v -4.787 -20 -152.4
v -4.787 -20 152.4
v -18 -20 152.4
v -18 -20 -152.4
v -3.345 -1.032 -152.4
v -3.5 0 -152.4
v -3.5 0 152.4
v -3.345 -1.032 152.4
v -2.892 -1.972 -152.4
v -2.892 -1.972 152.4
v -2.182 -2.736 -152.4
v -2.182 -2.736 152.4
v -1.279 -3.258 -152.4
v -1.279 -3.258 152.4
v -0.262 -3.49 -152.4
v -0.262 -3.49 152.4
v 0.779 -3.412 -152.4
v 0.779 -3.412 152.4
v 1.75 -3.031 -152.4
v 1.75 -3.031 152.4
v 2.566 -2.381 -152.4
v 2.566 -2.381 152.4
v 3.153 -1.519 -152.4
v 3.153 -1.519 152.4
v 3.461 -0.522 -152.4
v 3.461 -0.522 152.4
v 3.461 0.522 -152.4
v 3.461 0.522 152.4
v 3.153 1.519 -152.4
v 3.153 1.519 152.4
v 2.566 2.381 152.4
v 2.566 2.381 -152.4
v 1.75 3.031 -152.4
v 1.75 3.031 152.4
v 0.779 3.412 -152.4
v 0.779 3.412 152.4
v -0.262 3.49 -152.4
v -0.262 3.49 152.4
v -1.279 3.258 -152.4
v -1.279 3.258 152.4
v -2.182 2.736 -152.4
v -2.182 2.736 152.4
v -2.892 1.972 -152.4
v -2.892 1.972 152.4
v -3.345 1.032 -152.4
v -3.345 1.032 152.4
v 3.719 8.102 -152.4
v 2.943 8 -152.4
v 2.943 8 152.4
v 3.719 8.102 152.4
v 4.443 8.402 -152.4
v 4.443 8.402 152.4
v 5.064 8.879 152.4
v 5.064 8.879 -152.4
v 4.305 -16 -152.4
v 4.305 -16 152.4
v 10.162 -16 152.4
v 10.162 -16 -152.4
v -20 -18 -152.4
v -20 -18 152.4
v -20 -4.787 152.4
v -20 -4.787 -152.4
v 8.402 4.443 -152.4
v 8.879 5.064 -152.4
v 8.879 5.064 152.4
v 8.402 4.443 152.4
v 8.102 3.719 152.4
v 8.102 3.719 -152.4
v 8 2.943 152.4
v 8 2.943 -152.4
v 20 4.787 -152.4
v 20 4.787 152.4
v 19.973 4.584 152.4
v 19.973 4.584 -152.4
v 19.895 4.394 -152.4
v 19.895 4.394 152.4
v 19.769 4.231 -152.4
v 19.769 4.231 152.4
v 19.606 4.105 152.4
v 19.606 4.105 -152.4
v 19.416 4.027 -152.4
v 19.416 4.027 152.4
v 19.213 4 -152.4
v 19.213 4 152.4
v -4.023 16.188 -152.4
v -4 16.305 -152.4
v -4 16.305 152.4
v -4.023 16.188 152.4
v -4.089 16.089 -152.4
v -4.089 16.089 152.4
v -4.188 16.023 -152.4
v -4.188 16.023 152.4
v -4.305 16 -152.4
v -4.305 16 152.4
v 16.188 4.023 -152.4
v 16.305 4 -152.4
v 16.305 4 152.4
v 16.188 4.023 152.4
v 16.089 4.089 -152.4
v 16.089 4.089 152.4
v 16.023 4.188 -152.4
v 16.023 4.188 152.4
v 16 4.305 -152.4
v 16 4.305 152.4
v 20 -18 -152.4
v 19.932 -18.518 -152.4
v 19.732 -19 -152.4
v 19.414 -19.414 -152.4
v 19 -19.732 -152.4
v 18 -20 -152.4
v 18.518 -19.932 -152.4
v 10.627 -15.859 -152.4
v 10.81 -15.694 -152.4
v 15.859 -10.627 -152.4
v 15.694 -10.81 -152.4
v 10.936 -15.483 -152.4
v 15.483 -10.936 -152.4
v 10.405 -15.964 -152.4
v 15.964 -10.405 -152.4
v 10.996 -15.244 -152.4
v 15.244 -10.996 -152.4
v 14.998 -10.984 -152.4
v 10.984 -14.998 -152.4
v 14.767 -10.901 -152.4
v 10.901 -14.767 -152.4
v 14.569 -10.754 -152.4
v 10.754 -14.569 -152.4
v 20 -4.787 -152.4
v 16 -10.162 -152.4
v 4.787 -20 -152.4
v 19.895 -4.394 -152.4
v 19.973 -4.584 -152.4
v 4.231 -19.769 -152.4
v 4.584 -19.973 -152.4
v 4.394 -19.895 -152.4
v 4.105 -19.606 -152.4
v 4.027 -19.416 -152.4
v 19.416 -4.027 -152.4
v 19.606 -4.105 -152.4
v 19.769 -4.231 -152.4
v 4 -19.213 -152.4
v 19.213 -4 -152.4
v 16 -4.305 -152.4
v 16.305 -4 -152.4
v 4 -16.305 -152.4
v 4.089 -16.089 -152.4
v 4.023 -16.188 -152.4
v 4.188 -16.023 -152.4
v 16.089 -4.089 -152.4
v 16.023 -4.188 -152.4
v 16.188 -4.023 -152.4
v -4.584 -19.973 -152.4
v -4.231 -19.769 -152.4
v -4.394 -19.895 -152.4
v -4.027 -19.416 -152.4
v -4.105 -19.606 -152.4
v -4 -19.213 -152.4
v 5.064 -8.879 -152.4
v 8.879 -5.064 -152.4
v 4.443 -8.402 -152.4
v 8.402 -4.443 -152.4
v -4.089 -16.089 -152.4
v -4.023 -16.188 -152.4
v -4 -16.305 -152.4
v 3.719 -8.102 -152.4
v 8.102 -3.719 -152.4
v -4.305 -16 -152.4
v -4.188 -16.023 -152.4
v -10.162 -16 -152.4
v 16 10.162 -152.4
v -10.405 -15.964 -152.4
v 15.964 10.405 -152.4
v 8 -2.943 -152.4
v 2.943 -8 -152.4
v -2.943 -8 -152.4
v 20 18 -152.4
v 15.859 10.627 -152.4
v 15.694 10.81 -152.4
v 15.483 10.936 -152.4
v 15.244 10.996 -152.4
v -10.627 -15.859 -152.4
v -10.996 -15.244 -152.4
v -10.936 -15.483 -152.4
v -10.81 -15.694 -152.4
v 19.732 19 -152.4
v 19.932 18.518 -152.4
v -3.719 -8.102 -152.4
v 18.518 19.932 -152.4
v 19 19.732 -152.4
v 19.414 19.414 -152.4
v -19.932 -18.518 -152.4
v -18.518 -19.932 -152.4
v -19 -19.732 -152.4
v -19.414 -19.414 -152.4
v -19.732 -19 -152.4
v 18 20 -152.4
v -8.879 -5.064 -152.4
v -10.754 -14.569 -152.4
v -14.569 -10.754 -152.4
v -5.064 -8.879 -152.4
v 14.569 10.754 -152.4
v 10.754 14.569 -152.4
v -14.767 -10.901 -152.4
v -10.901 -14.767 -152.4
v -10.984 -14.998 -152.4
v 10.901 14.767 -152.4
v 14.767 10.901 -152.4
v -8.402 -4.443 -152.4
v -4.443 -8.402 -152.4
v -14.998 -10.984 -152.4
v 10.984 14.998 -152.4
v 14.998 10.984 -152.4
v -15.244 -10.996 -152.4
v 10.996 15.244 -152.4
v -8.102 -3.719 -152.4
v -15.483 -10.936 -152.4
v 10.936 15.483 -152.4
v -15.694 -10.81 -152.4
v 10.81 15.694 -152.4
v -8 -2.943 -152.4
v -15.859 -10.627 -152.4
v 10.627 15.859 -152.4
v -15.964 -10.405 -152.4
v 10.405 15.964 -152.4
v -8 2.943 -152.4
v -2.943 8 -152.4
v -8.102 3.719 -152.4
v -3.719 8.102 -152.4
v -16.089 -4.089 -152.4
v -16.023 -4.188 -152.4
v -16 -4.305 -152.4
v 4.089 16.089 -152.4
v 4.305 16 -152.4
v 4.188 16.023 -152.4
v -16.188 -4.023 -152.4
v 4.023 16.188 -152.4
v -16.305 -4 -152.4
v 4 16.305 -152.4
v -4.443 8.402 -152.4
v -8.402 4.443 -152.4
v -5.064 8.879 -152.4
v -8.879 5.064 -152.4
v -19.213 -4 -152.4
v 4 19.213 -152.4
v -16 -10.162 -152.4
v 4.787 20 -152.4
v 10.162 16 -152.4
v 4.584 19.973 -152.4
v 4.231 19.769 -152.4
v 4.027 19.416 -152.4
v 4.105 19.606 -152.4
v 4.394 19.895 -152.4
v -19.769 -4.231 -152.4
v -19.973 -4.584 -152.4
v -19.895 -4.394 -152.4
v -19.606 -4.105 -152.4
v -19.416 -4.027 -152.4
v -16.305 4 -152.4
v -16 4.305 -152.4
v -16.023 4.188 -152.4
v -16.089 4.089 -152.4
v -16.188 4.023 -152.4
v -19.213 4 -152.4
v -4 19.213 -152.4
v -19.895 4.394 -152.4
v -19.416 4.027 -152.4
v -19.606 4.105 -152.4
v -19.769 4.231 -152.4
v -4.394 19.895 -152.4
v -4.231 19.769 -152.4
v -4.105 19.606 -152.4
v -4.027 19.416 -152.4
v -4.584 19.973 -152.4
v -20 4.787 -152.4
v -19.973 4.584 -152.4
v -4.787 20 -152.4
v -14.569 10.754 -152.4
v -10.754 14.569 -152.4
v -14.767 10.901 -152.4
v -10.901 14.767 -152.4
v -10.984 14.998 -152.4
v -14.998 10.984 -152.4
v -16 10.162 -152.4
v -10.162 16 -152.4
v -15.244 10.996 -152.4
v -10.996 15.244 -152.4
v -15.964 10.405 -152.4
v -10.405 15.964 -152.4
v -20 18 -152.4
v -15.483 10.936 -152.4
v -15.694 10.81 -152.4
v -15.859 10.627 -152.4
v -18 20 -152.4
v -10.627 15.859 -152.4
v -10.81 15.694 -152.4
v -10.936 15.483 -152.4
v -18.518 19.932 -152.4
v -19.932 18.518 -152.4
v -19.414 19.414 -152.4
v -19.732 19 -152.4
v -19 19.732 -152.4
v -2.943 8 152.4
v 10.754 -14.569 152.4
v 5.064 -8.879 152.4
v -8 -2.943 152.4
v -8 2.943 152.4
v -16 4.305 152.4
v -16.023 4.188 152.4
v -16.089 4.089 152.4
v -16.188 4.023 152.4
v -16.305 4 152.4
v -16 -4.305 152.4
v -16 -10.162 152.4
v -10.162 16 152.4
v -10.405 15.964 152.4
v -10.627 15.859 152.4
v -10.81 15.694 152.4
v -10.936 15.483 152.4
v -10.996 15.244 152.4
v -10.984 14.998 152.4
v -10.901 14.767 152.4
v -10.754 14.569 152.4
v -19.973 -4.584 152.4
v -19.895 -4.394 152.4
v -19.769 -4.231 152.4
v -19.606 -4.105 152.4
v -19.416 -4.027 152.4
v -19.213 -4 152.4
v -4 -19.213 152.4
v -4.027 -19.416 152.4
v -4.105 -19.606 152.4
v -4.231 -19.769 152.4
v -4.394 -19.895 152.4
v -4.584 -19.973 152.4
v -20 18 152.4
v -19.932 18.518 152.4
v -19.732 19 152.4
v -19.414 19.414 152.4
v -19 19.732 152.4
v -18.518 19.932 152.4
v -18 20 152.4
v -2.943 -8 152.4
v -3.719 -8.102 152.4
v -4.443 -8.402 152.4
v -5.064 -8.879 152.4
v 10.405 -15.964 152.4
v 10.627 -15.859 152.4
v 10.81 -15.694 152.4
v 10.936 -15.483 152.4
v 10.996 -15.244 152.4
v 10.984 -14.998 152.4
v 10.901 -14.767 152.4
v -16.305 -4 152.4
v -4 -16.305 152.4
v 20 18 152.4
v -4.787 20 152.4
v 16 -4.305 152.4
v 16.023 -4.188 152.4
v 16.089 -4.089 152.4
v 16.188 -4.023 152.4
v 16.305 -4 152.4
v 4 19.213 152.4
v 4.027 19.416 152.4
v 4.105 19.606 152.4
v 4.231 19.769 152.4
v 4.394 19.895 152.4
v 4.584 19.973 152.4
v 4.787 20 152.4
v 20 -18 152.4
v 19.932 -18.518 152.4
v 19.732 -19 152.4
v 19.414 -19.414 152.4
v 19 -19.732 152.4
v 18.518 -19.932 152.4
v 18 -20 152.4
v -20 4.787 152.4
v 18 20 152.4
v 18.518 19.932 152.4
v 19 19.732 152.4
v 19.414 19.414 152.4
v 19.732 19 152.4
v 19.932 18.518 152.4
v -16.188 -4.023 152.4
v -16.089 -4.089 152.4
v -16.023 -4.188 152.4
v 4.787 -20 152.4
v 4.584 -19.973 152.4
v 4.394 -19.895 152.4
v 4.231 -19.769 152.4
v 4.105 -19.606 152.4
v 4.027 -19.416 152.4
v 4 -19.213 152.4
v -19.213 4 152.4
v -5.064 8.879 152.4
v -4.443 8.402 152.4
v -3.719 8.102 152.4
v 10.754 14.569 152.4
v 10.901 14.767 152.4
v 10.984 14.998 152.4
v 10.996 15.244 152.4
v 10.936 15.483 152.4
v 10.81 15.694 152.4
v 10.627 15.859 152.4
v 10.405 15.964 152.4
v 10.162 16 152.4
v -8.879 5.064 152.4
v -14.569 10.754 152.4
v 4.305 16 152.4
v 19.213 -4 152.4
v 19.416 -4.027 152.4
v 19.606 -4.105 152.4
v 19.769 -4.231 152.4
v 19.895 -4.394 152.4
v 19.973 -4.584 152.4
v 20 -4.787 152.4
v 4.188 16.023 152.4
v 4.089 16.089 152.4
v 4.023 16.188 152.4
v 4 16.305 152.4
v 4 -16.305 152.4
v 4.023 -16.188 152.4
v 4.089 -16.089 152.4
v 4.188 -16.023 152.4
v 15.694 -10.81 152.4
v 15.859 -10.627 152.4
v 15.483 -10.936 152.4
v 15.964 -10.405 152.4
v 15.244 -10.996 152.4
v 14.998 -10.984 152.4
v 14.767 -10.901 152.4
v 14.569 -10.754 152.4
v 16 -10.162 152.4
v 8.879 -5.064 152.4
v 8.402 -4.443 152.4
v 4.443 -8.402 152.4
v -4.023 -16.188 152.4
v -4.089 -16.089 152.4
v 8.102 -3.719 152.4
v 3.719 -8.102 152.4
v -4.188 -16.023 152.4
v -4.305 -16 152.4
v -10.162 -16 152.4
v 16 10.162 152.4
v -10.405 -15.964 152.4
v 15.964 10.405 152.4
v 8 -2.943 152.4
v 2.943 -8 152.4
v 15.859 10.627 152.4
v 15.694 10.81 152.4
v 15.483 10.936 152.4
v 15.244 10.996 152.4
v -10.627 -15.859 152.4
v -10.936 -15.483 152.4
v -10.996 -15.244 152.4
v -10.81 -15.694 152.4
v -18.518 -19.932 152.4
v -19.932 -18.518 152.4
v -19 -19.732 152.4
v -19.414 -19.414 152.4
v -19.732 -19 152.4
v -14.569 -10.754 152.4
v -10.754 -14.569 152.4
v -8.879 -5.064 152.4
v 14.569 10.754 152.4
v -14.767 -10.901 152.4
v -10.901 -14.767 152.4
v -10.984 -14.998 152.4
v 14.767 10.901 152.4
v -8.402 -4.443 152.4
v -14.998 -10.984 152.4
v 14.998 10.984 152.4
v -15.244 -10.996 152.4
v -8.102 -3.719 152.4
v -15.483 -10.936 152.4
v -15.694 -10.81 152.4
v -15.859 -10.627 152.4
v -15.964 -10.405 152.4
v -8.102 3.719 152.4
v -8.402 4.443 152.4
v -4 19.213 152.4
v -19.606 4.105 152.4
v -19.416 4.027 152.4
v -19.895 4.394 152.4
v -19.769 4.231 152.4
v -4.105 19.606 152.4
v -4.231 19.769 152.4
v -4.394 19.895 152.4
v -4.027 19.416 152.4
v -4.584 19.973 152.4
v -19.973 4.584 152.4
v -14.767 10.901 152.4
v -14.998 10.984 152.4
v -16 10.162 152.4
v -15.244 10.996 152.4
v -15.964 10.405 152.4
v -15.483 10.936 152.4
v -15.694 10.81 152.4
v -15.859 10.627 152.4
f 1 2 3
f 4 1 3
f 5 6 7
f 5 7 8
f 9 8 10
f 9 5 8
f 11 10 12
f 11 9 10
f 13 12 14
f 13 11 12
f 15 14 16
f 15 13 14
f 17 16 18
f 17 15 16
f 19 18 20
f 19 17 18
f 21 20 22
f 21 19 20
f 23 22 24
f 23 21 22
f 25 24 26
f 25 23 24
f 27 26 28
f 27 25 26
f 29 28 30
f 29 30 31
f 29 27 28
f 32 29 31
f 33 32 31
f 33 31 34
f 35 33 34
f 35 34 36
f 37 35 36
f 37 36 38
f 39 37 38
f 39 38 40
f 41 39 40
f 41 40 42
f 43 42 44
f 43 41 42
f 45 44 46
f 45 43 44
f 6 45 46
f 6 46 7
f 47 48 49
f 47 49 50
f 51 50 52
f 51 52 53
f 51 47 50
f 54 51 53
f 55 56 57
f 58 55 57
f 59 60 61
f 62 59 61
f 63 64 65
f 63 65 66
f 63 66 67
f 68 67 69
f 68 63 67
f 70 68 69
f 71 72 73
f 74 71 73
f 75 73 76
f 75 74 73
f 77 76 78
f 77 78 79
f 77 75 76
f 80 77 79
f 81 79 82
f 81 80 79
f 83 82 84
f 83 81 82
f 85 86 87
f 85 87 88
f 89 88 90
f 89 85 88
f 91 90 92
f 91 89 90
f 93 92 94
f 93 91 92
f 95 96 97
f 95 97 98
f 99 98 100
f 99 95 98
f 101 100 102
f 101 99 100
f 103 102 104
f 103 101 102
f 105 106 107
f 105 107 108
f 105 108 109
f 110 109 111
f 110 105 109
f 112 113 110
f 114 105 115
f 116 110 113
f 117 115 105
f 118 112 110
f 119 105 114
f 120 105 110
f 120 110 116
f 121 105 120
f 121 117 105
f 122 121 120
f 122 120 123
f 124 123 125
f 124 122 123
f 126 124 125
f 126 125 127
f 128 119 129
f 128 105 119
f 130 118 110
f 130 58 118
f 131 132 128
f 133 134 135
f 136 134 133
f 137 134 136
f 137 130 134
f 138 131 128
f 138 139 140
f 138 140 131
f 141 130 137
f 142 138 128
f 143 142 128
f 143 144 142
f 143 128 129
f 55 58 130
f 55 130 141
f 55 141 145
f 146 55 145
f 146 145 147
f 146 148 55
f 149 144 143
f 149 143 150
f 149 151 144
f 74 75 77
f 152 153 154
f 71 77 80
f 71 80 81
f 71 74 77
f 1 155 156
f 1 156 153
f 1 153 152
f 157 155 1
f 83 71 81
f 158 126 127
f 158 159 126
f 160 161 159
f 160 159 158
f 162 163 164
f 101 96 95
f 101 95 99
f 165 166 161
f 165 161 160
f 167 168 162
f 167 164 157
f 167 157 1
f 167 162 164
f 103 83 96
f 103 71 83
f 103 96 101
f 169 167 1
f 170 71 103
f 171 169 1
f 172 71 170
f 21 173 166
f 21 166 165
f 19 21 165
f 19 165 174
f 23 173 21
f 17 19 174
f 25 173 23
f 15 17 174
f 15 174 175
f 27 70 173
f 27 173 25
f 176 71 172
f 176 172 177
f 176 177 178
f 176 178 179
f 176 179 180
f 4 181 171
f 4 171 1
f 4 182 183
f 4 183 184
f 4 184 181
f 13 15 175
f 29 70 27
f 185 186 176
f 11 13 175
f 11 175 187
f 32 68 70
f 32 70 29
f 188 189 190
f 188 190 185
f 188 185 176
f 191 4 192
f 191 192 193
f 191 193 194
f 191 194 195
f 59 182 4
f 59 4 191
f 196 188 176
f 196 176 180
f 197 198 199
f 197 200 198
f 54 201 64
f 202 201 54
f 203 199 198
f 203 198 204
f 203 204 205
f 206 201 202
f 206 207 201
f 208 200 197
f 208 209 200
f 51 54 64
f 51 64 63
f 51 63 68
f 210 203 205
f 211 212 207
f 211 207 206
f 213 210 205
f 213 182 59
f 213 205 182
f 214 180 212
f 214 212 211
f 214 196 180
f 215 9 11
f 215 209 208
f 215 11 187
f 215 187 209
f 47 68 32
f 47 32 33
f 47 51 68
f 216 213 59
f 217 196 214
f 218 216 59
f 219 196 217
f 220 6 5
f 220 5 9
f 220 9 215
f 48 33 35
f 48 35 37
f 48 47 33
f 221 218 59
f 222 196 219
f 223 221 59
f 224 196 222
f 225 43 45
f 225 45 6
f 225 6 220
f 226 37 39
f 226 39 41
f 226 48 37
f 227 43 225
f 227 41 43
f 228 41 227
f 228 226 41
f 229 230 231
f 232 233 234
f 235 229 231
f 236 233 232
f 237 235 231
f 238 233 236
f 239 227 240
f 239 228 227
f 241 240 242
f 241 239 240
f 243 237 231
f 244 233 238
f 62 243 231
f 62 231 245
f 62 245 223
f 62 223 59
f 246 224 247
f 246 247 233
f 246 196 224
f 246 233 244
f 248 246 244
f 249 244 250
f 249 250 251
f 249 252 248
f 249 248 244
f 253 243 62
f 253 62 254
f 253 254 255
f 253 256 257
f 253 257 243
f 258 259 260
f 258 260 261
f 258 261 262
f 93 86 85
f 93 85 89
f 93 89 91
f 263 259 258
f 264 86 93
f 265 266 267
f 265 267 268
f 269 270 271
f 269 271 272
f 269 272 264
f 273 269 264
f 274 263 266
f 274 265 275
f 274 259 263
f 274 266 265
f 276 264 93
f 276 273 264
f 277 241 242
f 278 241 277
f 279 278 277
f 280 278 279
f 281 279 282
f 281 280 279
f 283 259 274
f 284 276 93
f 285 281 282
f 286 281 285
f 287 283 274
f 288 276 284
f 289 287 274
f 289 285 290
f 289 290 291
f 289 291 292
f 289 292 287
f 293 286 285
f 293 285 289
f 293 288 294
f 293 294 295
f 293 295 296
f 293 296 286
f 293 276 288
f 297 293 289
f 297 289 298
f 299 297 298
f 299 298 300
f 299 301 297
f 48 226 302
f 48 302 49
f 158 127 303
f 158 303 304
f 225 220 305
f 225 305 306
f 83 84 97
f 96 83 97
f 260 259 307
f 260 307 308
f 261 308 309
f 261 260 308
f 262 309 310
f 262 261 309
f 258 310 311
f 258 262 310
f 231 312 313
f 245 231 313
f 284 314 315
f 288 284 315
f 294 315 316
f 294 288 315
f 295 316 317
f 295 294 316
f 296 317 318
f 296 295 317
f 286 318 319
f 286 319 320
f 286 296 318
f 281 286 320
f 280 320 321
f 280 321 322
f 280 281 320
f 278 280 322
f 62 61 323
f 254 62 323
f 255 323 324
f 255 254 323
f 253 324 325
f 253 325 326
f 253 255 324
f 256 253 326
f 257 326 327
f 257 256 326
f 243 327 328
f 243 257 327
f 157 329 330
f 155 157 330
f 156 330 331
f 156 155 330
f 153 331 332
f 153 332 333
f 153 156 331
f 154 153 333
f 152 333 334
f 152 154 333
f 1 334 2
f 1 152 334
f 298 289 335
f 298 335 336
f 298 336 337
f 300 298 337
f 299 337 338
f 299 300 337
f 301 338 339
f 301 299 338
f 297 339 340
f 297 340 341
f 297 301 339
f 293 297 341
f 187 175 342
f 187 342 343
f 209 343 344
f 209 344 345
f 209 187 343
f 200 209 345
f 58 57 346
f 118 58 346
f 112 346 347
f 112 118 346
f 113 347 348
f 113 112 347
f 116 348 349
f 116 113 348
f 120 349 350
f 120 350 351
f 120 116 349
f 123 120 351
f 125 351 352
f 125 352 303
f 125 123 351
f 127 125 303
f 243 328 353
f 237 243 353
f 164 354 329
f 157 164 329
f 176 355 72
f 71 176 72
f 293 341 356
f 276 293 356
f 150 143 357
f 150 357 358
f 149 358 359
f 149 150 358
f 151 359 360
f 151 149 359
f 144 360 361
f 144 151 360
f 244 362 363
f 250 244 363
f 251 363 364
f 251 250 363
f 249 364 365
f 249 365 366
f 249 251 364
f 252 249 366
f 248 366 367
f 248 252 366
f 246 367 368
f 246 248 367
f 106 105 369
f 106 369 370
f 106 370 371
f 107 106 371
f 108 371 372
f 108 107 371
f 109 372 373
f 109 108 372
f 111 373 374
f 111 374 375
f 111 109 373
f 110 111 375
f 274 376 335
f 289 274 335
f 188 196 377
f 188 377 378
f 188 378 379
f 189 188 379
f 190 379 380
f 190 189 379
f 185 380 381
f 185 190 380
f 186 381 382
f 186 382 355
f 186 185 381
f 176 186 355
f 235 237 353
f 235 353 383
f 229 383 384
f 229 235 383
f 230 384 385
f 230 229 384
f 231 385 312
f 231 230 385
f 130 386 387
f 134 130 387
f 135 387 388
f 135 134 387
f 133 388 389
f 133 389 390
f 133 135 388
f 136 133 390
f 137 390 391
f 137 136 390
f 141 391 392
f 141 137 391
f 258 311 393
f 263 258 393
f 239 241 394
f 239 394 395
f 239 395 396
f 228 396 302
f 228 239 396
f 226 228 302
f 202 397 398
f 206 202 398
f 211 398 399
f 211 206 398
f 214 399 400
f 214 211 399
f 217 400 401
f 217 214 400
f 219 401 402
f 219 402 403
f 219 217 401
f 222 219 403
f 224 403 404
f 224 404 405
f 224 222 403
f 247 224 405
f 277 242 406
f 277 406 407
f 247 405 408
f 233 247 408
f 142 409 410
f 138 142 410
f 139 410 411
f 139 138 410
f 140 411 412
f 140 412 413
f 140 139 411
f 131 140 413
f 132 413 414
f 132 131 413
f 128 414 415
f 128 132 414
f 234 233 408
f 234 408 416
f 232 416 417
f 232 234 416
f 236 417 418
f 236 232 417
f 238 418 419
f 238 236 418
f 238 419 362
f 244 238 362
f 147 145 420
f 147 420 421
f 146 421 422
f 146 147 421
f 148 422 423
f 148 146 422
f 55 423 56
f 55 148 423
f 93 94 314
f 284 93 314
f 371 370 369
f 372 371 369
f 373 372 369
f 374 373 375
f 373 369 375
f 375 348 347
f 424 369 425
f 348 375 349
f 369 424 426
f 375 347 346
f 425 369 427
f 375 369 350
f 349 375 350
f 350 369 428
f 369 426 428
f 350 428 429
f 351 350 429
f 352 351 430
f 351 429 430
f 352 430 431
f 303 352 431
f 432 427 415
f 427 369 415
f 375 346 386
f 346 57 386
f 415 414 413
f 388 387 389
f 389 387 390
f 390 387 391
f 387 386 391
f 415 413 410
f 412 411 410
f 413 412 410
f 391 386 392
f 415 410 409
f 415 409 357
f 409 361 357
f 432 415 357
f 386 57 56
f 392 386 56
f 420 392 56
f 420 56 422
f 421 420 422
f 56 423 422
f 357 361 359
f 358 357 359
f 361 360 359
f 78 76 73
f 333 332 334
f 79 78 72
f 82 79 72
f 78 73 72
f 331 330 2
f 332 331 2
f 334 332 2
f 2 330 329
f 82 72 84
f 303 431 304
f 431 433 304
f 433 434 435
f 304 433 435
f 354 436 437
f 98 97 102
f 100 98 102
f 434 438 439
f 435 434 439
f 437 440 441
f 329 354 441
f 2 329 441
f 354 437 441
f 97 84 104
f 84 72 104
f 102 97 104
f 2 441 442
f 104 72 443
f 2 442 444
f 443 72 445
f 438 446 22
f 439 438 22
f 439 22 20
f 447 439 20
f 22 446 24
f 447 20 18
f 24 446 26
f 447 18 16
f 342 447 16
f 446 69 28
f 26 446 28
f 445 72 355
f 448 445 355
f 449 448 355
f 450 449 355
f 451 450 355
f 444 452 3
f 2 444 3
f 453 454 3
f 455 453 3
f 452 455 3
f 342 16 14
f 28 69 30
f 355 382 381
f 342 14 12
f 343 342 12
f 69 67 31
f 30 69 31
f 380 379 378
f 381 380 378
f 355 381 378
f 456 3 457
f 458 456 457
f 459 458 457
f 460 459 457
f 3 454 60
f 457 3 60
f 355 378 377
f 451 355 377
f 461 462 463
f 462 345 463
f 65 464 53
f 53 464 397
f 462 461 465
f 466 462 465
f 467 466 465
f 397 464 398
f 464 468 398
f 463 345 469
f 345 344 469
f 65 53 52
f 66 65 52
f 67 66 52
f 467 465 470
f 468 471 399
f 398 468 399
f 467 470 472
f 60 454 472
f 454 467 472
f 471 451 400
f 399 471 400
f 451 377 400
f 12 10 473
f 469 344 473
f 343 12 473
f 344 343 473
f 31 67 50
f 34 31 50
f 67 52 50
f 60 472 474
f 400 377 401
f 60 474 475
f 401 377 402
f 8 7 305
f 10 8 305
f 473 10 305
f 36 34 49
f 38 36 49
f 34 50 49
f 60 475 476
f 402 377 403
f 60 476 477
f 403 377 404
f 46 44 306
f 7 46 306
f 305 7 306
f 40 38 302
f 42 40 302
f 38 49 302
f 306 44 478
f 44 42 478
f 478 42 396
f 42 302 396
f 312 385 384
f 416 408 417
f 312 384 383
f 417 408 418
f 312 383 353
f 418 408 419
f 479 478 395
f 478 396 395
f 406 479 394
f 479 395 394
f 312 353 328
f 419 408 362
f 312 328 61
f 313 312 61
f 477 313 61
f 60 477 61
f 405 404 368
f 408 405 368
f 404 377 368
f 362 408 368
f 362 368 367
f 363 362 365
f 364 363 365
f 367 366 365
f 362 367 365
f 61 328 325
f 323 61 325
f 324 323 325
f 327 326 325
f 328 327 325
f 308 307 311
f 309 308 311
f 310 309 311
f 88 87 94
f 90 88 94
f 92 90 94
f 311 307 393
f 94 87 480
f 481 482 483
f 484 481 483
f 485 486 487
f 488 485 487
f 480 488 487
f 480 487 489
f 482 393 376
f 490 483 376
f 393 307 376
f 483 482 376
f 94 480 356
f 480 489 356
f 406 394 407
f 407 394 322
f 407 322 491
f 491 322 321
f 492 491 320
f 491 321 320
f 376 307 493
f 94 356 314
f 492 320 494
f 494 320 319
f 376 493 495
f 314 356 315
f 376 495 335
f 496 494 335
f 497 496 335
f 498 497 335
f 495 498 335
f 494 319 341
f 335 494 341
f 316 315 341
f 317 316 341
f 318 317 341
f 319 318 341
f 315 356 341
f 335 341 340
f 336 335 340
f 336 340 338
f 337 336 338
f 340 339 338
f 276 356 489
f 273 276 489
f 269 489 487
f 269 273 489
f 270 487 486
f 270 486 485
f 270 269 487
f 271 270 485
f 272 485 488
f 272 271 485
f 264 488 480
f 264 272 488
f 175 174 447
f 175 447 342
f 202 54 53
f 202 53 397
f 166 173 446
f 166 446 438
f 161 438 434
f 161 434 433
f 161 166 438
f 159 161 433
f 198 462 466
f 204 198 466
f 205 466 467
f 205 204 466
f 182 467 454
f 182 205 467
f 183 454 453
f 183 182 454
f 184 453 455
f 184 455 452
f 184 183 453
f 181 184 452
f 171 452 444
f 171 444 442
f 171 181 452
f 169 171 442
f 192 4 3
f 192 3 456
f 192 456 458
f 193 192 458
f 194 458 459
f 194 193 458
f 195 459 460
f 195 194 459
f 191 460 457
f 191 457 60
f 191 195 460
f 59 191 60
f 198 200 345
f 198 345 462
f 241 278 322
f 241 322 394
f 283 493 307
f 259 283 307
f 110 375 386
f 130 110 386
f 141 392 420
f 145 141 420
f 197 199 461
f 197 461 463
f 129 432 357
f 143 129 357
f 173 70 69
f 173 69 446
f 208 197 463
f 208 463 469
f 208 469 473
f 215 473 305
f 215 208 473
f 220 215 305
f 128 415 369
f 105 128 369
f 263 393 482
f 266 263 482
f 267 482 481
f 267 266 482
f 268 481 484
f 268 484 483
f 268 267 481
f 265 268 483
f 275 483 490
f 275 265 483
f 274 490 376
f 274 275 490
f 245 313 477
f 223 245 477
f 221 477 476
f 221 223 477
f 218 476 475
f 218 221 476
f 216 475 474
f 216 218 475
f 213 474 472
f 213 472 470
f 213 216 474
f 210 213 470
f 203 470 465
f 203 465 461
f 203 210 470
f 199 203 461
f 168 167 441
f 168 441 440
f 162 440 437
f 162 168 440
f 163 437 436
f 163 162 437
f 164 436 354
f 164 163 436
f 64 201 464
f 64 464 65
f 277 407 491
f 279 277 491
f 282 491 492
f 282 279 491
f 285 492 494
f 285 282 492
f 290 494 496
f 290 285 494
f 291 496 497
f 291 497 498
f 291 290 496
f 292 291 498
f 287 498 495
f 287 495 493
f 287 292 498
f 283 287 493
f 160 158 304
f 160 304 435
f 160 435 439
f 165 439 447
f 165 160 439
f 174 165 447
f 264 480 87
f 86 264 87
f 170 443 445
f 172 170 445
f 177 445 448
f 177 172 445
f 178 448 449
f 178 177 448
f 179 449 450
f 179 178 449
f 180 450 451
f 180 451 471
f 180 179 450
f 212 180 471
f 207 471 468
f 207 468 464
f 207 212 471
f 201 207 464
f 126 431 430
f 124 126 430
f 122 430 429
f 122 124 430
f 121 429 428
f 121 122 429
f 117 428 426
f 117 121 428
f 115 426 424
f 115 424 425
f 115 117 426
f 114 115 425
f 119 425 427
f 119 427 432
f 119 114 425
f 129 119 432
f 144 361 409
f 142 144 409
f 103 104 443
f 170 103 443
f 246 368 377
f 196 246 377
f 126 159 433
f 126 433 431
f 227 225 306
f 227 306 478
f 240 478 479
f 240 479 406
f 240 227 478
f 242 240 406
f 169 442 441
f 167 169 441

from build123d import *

# Parameters (mm, degrees)
BOSS_EXTRUDE1_DEPTH      = 152.4
BOSS_EXTRUDE1_DEPTH_BACK = 152.4
SKETCH3_R                = 3.5


with BuildPart() as part:
    # Sketch3 → Boss-Extrude1 (new, two sides: drawn at the far end of the back side and taken through both)
    with BuildSketch(Plane.XY.offset(-BOSS_EXTRUDE1_DEPTH_BACK)):
        with BuildLine():
            Line((4.7874, 20), (18, 20))
            ThreePointArc((18, 20), (19.414213562, 19.414213562), (20, 18))
            Line((20, 18), (20, 4.7874))
            ThreePointArc((20, 4.7874), (19.76937588, 4.23062412), (19.2126, 4))
            Line((19.2126, 4), (16.3048, 4))
            ThreePointArc((16.3048, 4), (16.089273853, 4.089273853), (16, 4.3048))
            Line((16, 4.3048), (16, 10.1618))
            ThreePointArc((16, 10.1618), (15.482565253, 10.936195824), (14.569103096, 10.754496904))
            Line((14.569103096, 10.754496904), (8.878679656, 5.064073464))
            ThreePointArc((8.878679656, 5.064073464), (8.228361402, 4.090803418), (8, 2.942753121))
            Line((8, 2.942753121), (8, -2.942753121))
            ThreePointArc((8, -2.942753121), (8.228361402, -4.090803418), (8.878679656, -5.064073464))
            Line((8.878679656, -5.064073464), (14.569103096, -10.754496904))
            ThreePointArc((14.569103096, -10.754496904), (15.482565253, -10.936195824), (16, -10.1618))
            Line((16, -10.1618), (16, -4.3048))
            ThreePointArc((16, -4.3048), (16.089273853, -4.089273853), (16.3048, -4))
            Line((16.3048, -4), (19.2126, -4))
            ThreePointArc((19.2126, -4), (19.76937588, -4.23062412), (20, -4.7874))
            Line((20, -4.7874), (20, -18))
            ThreePointArc((20, -18), (19.414213562, -19.414213562), (18, -20))
            Line((18, -20), (4.7874, -20))
            ThreePointArc((4.7874, -20), (4.23062412, -19.76937588), (4, -19.2126))
            Line((4, -19.2126), (4, -16.3048))
            ThreePointArc((4, -16.3048), (4.089273853, -16.089273853), (4.3048, -16))
            Line((4.3048, -16), (10.1618, -16))
            ThreePointArc((10.1618, -16), (10.936195824, -15.482565253), (10.754496904, -14.569103096))
            Line((10.754496904, -14.569103096), (5.064073464, -8.878679656))
            ThreePointArc((5.064073464, -8.878679656), (4.090803418, -8.228361402), (2.942753121, -8))
            Line((2.942753121, -8), (-2.942753121, -8))
            ThreePointArc((-2.942753121, -8), (-4.090803418, -8.228361402), (-5.064073464, -8.878679656))
            Line((-5.064073464, -8.878679656), (-10.754496904, -14.569103096))
            ThreePointArc((-10.754496904, -14.569103096), (-10.936195824, -15.482565253), (-10.1618, -16))
            Line((-10.1618, -16), (-4.3048, -16))
            ThreePointArc((-4.3048, -16), (-4.089273853, -16.089273853), (-4, -16.3048))
            Line((-4, -16.3048), (-4, -19.2126))
            ThreePointArc((-4, -19.2126), (-4.23062412, -19.76937588), (-4.7874, -20))
            Line((-4.7874, -20), (-18, -20))
            ThreePointArc((-18, -20), (-19.414213562, -19.414213562), (-20, -18))
            Line((-20, -18), (-20, -4.7874))
            ThreePointArc((-20, -4.7874), (-19.76937588, -4.23062412), (-19.2126, -4))
            Line((-19.2126, -4), (-16.3048, -4))
            ThreePointArc((-16.3048, -4), (-16.089273853, -4.089273853), (-16, -4.3048))
            Line((-16, -4.3048), (-16, -10.1618))
            ThreePointArc((-16, -10.1618), (-15.482565253, -10.936195824), (-14.569103096, -10.754496904))
            Line((-14.569103096, -10.754496904), (-8.878679656, -5.064073464))
            ThreePointArc((-8.878679656, -5.064073464), (-8.228361402, -4.090803418), (-8, -2.942753121))
            Line((-8, -2.942753121), (-8, 2.942753121))
            ThreePointArc((-8, 2.942753121), (-8.228361402, 4.090803418), (-8.878679656, 5.064073464))
            Line((-8.878679656, 5.064073464), (-14.569103096, 10.754496904))
            ThreePointArc((-14.569103096, 10.754496904), (-15.482565253, 10.936195824), (-16, 10.1618))
            Line((-16, 10.1618), (-16, 4.3048))
            ThreePointArc((-16, 4.3048), (-16.089273853, 4.089273853), (-16.3048, 4))
            Line((-16.3048, 4), (-19.2126, 4))
            ThreePointArc((-19.2126, 4), (-19.76937588, 4.23062412), (-20, 4.7874))
            Line((-20, 4.7874), (-20, 18))
            ThreePointArc((-20, 18), (-19.414213562, 19.414213562), (-18, 20))
            Line((-18, 20), (-4.7874, 20))
            ThreePointArc((-4.7874, 20), (-4.23062412, 19.76937588), (-4, 19.2126))
            Line((-4, 19.2126), (-4, 16.3048))
            ThreePointArc((-4, 16.3048), (-4.089273853, 16.089273853), (-4.3048, 16))
            Line((-4.3048, 16), (-10.1618, 16))
            ThreePointArc((-10.1618, 16), (-10.936195824, 15.482565253), (-10.754496904, 14.569103096))
            Line((-10.754496904, 14.569103096), (-5.064073464, 8.878679656))
            ThreePointArc((-5.064073464, 8.878679656), (-4.090803418, 8.228361402), (-2.942753121, 8))
            Line((-2.942753121, 8), (2.942753121, 8))
            ThreePointArc((2.942753121, 8), (4.090803418, 8.228361402), (5.064073464, 8.878679656))
            Line((5.064073464, 8.878679656), (10.754496904, 14.569103096))
            ThreePointArc((10.754496904, 14.569103096), (10.936195824, 15.482565253), (10.1618, 16))
            Line((10.1618, 16), (4.3048, 16))
            ThreePointArc((4.3048, 16), (4.089273853, 16.089273853), (4, 16.3048))
            Line((4, 16.3048), (4, 19.2126))
            ThreePointArc((4, 19.2126), (4.23062412, 19.76937588), (4.7874, 20))
        make_face()
        with Locations(Location((0, 0, 0), (0, 0, 180))):
            Circle(SKETCH3_R, mode=Mode.SUBTRACT)
    extrude(amount=BOSS_EXTRUDE1_DEPTH + BOSS_EXTRUDE1_DEPTH_BACK)


solid = part.part
